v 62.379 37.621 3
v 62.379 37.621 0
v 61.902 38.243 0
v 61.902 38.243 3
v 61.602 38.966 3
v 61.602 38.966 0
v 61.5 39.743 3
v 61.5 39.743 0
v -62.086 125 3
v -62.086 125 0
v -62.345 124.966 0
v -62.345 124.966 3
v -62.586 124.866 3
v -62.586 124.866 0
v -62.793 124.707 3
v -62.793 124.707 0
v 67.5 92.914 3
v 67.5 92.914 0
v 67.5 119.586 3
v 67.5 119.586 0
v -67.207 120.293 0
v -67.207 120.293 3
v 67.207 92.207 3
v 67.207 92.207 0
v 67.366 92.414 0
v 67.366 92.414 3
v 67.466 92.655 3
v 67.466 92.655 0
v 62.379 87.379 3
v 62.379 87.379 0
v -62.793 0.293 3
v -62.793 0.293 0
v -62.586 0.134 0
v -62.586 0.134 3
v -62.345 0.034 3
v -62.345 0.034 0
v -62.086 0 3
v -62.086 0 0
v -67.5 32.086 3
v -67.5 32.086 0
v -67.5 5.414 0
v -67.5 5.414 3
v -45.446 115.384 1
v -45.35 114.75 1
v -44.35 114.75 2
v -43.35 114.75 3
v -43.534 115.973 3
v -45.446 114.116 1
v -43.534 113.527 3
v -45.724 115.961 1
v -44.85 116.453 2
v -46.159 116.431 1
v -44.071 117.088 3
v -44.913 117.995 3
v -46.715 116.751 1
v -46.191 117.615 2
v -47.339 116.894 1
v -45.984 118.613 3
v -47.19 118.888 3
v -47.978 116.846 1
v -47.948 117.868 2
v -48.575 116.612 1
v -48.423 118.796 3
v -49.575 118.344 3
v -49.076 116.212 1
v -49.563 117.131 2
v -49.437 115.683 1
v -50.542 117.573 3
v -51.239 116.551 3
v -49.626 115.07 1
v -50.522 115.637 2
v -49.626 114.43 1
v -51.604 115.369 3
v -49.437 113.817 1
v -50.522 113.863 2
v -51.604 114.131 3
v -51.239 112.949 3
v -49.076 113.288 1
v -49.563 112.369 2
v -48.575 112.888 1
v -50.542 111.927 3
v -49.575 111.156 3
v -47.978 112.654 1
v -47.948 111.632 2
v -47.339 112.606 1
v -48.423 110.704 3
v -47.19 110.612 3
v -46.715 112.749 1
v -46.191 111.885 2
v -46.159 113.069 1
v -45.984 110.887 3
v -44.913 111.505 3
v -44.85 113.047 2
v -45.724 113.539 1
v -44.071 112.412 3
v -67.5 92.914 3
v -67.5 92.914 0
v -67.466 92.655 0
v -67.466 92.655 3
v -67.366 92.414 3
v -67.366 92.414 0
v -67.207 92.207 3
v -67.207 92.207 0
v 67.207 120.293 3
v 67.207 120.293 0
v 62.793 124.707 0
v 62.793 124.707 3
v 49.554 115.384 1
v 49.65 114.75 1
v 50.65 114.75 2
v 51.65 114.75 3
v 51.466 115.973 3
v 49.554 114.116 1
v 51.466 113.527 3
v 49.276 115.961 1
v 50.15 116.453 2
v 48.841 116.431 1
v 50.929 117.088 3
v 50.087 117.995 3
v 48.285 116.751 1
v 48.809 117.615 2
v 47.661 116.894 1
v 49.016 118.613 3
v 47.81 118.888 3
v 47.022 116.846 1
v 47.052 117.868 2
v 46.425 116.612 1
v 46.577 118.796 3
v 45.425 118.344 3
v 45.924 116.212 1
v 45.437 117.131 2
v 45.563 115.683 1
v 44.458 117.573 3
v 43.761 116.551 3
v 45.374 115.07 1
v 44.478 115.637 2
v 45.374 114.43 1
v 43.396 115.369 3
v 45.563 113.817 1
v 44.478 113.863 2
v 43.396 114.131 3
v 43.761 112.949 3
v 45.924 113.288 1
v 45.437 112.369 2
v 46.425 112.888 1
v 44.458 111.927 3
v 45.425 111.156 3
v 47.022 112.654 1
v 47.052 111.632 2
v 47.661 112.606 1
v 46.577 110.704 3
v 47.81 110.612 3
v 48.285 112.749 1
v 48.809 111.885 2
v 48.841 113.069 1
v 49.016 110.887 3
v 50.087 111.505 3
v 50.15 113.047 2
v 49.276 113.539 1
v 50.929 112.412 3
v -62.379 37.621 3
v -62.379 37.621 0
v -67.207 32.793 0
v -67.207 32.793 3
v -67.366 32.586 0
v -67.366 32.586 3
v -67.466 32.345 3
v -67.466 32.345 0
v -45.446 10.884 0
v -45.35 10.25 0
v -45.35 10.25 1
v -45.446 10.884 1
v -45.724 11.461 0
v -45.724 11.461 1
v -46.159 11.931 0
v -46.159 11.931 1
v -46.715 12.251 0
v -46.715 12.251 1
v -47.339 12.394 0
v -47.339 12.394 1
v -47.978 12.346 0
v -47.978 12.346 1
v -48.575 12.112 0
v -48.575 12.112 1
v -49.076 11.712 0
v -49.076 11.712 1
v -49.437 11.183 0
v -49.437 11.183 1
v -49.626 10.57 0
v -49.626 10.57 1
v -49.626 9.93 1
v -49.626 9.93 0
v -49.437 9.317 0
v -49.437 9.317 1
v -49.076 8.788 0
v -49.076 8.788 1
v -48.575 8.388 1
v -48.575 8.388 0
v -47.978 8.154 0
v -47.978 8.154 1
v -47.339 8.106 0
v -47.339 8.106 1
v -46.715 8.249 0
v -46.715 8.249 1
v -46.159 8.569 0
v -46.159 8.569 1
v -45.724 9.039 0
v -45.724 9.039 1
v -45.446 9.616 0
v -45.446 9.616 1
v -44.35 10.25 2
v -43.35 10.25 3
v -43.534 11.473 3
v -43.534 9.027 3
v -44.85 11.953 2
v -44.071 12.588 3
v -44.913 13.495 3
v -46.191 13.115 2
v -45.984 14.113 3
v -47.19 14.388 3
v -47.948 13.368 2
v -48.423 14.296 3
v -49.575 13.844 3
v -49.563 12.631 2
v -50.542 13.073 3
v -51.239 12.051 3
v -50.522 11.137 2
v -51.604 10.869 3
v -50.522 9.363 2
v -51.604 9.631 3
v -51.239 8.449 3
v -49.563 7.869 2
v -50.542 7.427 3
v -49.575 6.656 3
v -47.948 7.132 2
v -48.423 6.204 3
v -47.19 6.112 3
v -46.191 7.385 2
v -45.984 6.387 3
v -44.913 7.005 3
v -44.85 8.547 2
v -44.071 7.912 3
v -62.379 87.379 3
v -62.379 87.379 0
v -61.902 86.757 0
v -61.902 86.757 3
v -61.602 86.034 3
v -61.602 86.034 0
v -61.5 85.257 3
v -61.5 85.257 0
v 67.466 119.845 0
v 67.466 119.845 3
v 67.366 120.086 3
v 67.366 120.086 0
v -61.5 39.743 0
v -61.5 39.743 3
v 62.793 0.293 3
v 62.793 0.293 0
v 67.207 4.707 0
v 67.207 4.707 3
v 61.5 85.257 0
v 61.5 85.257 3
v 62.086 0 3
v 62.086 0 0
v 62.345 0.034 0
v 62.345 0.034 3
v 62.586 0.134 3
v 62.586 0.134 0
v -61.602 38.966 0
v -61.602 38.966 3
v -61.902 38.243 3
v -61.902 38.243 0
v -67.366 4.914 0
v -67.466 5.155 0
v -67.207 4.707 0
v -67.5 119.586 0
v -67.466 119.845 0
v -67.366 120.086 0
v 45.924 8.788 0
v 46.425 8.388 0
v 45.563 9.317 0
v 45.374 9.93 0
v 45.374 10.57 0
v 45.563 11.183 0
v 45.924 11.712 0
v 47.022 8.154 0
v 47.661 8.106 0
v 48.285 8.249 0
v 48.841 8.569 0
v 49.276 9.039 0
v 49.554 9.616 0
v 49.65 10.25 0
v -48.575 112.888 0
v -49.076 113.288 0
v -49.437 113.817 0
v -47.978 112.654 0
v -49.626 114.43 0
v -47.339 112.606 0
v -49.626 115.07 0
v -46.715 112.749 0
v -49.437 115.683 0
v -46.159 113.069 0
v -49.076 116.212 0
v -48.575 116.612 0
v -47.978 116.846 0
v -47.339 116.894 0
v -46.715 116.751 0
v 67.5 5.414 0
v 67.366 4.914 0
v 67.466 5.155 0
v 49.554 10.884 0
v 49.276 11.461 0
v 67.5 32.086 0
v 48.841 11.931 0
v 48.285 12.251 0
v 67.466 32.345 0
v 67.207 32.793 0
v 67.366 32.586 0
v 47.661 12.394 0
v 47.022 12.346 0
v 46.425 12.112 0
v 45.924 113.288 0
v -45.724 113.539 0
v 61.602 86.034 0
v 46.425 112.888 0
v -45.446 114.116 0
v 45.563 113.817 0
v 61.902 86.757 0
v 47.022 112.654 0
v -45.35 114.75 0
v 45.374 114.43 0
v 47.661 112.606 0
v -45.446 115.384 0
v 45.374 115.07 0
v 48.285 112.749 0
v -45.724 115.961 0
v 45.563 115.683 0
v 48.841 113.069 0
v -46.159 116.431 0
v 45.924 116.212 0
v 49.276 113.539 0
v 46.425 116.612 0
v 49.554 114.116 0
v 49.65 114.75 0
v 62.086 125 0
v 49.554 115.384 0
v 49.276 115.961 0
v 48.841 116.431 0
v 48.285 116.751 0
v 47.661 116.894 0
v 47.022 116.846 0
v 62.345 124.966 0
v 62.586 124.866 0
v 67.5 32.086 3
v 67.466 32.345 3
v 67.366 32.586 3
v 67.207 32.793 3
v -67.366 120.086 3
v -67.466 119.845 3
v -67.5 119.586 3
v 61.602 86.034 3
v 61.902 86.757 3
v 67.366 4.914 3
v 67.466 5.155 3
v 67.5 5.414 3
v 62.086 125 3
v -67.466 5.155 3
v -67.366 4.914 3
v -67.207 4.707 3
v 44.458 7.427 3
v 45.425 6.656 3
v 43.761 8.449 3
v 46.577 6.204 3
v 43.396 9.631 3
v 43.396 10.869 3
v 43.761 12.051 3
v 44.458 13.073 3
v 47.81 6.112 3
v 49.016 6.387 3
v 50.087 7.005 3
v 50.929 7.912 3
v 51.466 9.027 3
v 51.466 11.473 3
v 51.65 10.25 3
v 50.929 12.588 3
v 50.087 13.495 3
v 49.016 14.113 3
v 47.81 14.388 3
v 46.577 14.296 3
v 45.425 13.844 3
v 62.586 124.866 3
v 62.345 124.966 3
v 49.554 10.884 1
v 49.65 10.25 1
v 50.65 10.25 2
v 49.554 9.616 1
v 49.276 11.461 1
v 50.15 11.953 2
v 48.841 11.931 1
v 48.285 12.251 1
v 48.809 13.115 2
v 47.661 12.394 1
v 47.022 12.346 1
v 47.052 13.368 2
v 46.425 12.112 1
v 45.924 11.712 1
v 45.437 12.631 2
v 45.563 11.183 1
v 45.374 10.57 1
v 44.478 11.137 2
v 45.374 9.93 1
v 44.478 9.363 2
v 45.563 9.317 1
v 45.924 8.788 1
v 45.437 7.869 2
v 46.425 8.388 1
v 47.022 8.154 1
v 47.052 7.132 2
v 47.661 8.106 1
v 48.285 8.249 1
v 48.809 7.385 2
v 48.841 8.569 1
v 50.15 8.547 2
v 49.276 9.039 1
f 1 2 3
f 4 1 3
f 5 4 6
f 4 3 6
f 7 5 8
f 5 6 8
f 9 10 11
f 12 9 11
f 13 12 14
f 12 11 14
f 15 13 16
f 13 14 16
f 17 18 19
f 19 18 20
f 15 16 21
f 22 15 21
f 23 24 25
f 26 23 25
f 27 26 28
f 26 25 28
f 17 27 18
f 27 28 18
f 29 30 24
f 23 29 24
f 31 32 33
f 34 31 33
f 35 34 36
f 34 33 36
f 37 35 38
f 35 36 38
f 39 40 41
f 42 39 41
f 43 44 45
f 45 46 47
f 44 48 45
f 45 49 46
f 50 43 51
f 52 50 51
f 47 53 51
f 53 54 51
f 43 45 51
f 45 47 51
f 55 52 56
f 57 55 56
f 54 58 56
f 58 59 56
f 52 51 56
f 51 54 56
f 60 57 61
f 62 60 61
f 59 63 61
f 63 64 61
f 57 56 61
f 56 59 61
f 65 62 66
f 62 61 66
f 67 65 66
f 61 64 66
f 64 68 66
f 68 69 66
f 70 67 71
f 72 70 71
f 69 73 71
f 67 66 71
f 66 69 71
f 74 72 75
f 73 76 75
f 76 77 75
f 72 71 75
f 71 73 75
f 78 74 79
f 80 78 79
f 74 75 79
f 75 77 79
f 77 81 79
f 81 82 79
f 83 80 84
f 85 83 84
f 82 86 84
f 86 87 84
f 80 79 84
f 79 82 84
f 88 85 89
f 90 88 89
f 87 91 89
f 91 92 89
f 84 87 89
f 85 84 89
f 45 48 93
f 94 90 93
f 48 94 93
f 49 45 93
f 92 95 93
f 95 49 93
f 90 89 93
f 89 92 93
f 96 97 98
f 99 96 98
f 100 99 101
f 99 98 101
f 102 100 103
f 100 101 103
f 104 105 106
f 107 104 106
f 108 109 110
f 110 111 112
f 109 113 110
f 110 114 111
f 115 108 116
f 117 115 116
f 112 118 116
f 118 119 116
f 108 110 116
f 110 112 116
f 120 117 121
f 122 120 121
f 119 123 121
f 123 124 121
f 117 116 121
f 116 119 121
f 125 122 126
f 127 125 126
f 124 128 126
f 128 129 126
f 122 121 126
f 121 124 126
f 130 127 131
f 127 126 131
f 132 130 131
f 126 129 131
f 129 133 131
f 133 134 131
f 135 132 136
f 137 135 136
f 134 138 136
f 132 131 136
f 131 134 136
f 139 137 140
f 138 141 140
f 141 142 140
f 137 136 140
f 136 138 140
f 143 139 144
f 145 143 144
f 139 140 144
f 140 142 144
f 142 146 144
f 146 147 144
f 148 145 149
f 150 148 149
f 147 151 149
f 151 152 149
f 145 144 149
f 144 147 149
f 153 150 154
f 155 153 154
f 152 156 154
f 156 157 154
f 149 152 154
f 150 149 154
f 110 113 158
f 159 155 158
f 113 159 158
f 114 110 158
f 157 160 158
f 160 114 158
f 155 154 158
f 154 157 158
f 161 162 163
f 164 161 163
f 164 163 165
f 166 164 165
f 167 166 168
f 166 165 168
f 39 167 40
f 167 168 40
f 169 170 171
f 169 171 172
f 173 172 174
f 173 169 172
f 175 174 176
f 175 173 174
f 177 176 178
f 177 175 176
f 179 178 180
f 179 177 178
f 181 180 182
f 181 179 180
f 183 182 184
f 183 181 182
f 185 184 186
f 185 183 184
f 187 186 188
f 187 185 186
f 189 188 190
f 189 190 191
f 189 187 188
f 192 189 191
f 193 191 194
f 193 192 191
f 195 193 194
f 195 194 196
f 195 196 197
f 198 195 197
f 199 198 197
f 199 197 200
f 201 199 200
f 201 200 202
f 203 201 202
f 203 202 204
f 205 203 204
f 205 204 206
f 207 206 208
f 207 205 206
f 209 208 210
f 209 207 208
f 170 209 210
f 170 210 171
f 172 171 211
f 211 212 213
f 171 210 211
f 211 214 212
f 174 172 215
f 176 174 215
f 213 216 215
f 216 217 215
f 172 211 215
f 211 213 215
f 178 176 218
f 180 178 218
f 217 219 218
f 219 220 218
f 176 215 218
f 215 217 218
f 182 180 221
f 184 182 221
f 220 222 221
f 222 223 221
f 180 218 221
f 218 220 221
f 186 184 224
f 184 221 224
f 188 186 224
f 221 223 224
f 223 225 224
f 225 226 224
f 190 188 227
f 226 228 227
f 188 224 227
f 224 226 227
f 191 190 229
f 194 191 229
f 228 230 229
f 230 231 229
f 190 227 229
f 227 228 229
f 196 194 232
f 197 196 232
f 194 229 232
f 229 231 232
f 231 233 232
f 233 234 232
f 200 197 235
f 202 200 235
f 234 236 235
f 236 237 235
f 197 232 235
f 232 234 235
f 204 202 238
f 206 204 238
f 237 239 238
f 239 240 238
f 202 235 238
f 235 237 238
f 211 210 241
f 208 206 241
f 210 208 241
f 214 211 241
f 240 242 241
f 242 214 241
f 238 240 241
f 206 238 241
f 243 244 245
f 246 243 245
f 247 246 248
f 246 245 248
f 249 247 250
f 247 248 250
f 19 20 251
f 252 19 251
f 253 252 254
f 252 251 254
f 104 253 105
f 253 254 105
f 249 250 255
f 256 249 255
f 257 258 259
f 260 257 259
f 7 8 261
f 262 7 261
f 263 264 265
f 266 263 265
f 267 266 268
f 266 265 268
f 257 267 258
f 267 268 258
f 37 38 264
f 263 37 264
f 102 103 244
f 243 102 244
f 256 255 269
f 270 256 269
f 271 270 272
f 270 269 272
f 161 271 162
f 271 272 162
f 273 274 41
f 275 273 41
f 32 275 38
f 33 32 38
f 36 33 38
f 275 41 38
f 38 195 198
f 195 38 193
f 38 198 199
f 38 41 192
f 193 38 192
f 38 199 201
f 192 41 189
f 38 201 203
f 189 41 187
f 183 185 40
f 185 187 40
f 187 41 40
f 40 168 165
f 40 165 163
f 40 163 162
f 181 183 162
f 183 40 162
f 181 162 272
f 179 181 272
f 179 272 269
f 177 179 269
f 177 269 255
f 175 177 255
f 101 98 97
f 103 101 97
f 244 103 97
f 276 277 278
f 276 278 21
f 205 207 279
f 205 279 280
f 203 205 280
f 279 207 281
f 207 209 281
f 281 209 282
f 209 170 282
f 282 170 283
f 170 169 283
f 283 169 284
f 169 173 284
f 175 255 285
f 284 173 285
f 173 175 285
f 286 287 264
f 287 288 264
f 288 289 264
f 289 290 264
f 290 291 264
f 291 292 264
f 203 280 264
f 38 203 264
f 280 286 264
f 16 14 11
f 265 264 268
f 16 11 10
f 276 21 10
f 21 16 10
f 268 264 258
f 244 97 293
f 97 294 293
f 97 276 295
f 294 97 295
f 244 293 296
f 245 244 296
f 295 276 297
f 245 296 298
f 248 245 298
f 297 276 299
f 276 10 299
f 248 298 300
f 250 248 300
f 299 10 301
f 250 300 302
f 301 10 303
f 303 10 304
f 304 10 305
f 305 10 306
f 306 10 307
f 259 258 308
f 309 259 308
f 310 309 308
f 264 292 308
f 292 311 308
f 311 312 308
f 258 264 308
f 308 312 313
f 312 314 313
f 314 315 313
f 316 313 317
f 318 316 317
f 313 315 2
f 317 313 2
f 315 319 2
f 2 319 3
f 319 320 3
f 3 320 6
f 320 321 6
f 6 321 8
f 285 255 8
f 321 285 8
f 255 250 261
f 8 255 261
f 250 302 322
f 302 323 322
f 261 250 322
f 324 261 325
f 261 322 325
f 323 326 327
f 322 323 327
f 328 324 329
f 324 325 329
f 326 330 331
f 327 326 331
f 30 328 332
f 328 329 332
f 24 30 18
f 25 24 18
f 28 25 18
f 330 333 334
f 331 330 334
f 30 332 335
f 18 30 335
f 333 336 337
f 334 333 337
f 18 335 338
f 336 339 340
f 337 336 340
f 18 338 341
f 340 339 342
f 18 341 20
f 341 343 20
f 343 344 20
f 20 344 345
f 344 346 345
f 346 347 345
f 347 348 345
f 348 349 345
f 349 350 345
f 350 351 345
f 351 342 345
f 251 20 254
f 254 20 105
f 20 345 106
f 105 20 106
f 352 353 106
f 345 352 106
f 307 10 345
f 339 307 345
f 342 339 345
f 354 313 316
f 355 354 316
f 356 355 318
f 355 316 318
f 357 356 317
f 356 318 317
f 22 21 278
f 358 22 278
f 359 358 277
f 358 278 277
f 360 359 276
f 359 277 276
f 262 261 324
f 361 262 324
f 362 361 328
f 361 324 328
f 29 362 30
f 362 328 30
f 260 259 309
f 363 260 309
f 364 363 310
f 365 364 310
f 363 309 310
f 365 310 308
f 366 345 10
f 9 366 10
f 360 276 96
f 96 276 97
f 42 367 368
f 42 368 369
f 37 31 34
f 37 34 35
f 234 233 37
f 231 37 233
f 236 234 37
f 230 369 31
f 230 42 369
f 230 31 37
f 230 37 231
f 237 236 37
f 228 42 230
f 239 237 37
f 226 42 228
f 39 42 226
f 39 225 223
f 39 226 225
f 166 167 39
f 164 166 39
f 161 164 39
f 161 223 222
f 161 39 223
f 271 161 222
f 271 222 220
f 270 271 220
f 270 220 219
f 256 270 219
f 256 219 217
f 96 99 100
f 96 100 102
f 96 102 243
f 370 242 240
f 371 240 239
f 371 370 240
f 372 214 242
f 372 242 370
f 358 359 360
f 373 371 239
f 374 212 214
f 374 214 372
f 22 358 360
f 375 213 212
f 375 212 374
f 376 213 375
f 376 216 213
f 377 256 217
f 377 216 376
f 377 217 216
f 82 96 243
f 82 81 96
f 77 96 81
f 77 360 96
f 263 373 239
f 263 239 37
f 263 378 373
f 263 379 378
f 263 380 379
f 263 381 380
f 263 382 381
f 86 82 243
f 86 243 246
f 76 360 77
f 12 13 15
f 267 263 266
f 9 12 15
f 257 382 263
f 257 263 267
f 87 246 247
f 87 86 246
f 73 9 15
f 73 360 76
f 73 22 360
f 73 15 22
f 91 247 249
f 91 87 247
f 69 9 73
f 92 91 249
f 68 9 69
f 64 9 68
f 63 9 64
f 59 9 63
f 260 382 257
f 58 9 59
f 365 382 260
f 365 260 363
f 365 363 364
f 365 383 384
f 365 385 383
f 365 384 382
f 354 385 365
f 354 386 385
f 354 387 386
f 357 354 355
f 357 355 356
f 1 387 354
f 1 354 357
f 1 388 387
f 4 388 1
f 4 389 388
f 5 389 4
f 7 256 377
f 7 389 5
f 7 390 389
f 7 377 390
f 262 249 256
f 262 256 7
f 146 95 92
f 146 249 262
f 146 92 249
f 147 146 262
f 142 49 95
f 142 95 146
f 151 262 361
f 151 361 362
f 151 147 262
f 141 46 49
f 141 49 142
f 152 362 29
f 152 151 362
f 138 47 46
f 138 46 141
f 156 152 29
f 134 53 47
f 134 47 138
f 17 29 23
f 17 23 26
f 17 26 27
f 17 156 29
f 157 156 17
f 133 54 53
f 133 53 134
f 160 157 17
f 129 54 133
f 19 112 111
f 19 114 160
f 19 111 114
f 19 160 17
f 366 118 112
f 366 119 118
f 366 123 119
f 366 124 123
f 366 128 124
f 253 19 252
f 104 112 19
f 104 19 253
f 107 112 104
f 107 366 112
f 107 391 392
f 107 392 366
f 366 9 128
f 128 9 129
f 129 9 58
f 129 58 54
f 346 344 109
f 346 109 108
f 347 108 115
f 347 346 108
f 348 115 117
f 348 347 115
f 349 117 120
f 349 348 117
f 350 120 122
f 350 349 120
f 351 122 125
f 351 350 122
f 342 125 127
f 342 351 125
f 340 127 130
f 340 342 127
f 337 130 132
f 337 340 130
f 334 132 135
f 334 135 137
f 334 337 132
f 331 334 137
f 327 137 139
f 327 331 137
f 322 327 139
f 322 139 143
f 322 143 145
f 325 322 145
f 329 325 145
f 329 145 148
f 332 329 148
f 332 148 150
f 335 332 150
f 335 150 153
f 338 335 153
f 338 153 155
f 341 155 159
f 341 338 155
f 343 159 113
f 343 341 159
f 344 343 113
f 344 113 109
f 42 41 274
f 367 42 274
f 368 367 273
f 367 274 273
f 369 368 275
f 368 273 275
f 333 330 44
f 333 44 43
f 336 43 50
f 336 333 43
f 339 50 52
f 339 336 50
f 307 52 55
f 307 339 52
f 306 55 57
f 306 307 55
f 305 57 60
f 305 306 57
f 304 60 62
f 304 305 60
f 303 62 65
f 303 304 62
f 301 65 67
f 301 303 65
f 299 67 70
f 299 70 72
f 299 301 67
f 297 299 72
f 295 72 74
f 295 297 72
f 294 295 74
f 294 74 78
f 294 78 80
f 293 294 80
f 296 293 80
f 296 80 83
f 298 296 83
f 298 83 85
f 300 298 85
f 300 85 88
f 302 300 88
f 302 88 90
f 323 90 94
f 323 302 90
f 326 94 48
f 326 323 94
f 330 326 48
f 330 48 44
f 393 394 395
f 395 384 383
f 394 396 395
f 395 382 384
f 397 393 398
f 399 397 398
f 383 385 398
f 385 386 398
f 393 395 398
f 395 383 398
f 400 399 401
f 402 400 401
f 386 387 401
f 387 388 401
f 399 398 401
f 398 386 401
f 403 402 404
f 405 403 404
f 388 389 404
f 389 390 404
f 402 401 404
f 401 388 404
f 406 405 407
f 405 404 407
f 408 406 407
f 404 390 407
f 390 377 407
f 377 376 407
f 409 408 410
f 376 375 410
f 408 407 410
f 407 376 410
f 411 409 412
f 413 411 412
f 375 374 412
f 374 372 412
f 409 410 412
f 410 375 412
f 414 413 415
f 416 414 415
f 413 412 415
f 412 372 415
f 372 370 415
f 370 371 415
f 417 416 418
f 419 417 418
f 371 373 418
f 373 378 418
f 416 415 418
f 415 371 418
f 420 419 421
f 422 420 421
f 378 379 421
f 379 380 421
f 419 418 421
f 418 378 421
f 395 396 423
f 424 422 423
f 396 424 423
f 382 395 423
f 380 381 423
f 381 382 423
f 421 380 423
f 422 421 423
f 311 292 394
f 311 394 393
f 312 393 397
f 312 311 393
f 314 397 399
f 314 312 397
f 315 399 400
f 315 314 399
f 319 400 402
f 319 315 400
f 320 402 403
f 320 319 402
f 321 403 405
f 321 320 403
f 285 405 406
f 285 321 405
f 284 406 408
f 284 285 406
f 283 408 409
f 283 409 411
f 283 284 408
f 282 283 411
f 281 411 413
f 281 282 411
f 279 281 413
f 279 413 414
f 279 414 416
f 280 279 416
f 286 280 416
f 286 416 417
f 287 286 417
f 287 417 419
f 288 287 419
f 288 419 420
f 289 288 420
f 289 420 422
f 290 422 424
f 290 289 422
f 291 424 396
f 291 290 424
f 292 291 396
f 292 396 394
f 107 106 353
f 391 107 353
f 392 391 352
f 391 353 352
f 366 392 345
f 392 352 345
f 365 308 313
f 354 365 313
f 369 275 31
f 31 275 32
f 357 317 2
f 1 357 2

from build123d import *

# Parameters (mm, degrees)
SKETCH_1_R      = 2.15
EXTRUDE_1_DEPTH = 3
CHAMFER_1_SIZE  = 2


with BuildPart() as part:
    # 草图1 → 凸台-拉伸1 (new body)
    with BuildSketch(Plane.XY):
        with BuildLine():
            Line((-61.5, 85.257359313), (-61.5, 39.742640687))
            ThreePointArc((-61.5, 39.742640687), (-61.728361402, 38.59459039), (-62.378679656, 37.621320344))
            Line((-62.378679656, 37.621320344), (-67.207106781, 32.792893219))
            ThreePointArc((-67.207106781, 32.792893219), (-67.423879533, 32.46846987), (-67.5, 32.085786438))
            Line((-67.5, 32.085786438), (-67.5, 5.414213562))
            ThreePointArc((-67.5, 5.414213562), (-67.423879533, 5.03153013), (-67.207106781, 4.707106781))
            Line((-67.207106781, 4.707106781), (-62.792893219, 0.292893219))
            ThreePointArc((-62.792893219, 0.292893219), (-62.46846987, 0.076120467), (-62.085786438, 0))
            Line((-62.085786438, 0), (62.085786438, 0))
            ThreePointArc((62.085786438, 0), (62.46846987, 0.076120467), (62.792893219, 0.292893219))
            Line((62.792893219, 0.292893219), (67.207106781, 4.707106781))
            ThreePointArc((67.207106781, 4.707106781), (67.423879533, 5.03153013), (67.5, 5.414213562))
            Line((67.5, 5.414213562), (67.5, 32.085786438))
            ThreePointArc((67.5, 32.085786438), (67.423879533, 32.46846987), (67.207106781, 32.792893219))
            Line((67.207106781, 32.792893219), (62.378679656, 37.621320344))
            ThreePointArc((62.378679656, 37.621320344), (61.728361402, 38.59459039), (61.5, 39.742640687))
            Line((61.5, 39.742640687), (61.5, 85.257359313))
            ThreePointArc((61.5, 85.257359313), (61.728361402, 86.40540961), (62.378679656, 87.378679656))
            Line((62.378679656, 87.378679656), (67.207106781, 92.207106781))
            ThreePointArc((67.207106781, 92.207106781), (67.423879533, 92.53153013), (67.5, 92.914213562))
            Line((67.5, 92.914213562), (67.5, 119.585786438))
            ThreePointArc((67.5, 119.585786438), (67.423879532, 119.96846987), (67.207106781, 120.292893219))
            Line((67.207106781, 120.292893219), (62.792893219, 124.707106781))
            ThreePointArc((62.792893219, 124.707106781), (62.46846987, 124.923879533), (62.085786438, 125))
            Line((62.085786438, 125), (-62.085786438, 125))
            ThreePointArc((-62.085786438, 125), (-62.46846987, 124.923879533), (-62.792893219, 124.707106781))
            Line((-62.792893219, 124.707106781), (-67.207106781, 120.292893219))
            ThreePointArc((-67.207106781, 120.292893219), (-67.423879533, 119.96846987), (-67.5, 119.585786438))
            Line((-67.5, 119.585786438), (-67.5, 92.914213562))
            ThreePointArc((-67.5, 92.914213562), (-67.423879533, 92.53153013), (-67.207106781, 92.207106781))
            Line((-67.207106781, 92.207106781), (-62.378679656, 87.378679656))
            ThreePointArc((-62.378679656, 87.378679656), (-61.728361402, 86.40540961), (-61.5, 85.257359313))
        make_face()
        with Locations((47.5, 10.25)):
            Circle(SKETCH_1_R, mode=Mode.SUBTRACT)
        with Locations((-47.5, 10.25)):
            Circle(SKETCH_1_R, mode=Mode.SUBTRACT)
        with Locations((-47.5, 114.75)):
            Circle(SKETCH_1_R, mode=Mode.SUBTRACT)
        with Locations((47.5, 114.75)):
            Circle(SKETCH_1_R, mode=Mode.SUBTRACT)
    extrude(amount=EXTRUDE_1_DEPTH)

    # 倒角1
    chamfer_1_edges = [part.edges().sort_by_distance(p)[0] for p in [
        (45.35, 10.25, 3),
        (-49.65, 10.25, 3),
        (-49.65, 114.75, 3),
        (45.35, 114.75, 3),
    ]]
    chamfer(chamfer_1_edges, length=CHAMFER_1_SIZE)


solid = part.part
